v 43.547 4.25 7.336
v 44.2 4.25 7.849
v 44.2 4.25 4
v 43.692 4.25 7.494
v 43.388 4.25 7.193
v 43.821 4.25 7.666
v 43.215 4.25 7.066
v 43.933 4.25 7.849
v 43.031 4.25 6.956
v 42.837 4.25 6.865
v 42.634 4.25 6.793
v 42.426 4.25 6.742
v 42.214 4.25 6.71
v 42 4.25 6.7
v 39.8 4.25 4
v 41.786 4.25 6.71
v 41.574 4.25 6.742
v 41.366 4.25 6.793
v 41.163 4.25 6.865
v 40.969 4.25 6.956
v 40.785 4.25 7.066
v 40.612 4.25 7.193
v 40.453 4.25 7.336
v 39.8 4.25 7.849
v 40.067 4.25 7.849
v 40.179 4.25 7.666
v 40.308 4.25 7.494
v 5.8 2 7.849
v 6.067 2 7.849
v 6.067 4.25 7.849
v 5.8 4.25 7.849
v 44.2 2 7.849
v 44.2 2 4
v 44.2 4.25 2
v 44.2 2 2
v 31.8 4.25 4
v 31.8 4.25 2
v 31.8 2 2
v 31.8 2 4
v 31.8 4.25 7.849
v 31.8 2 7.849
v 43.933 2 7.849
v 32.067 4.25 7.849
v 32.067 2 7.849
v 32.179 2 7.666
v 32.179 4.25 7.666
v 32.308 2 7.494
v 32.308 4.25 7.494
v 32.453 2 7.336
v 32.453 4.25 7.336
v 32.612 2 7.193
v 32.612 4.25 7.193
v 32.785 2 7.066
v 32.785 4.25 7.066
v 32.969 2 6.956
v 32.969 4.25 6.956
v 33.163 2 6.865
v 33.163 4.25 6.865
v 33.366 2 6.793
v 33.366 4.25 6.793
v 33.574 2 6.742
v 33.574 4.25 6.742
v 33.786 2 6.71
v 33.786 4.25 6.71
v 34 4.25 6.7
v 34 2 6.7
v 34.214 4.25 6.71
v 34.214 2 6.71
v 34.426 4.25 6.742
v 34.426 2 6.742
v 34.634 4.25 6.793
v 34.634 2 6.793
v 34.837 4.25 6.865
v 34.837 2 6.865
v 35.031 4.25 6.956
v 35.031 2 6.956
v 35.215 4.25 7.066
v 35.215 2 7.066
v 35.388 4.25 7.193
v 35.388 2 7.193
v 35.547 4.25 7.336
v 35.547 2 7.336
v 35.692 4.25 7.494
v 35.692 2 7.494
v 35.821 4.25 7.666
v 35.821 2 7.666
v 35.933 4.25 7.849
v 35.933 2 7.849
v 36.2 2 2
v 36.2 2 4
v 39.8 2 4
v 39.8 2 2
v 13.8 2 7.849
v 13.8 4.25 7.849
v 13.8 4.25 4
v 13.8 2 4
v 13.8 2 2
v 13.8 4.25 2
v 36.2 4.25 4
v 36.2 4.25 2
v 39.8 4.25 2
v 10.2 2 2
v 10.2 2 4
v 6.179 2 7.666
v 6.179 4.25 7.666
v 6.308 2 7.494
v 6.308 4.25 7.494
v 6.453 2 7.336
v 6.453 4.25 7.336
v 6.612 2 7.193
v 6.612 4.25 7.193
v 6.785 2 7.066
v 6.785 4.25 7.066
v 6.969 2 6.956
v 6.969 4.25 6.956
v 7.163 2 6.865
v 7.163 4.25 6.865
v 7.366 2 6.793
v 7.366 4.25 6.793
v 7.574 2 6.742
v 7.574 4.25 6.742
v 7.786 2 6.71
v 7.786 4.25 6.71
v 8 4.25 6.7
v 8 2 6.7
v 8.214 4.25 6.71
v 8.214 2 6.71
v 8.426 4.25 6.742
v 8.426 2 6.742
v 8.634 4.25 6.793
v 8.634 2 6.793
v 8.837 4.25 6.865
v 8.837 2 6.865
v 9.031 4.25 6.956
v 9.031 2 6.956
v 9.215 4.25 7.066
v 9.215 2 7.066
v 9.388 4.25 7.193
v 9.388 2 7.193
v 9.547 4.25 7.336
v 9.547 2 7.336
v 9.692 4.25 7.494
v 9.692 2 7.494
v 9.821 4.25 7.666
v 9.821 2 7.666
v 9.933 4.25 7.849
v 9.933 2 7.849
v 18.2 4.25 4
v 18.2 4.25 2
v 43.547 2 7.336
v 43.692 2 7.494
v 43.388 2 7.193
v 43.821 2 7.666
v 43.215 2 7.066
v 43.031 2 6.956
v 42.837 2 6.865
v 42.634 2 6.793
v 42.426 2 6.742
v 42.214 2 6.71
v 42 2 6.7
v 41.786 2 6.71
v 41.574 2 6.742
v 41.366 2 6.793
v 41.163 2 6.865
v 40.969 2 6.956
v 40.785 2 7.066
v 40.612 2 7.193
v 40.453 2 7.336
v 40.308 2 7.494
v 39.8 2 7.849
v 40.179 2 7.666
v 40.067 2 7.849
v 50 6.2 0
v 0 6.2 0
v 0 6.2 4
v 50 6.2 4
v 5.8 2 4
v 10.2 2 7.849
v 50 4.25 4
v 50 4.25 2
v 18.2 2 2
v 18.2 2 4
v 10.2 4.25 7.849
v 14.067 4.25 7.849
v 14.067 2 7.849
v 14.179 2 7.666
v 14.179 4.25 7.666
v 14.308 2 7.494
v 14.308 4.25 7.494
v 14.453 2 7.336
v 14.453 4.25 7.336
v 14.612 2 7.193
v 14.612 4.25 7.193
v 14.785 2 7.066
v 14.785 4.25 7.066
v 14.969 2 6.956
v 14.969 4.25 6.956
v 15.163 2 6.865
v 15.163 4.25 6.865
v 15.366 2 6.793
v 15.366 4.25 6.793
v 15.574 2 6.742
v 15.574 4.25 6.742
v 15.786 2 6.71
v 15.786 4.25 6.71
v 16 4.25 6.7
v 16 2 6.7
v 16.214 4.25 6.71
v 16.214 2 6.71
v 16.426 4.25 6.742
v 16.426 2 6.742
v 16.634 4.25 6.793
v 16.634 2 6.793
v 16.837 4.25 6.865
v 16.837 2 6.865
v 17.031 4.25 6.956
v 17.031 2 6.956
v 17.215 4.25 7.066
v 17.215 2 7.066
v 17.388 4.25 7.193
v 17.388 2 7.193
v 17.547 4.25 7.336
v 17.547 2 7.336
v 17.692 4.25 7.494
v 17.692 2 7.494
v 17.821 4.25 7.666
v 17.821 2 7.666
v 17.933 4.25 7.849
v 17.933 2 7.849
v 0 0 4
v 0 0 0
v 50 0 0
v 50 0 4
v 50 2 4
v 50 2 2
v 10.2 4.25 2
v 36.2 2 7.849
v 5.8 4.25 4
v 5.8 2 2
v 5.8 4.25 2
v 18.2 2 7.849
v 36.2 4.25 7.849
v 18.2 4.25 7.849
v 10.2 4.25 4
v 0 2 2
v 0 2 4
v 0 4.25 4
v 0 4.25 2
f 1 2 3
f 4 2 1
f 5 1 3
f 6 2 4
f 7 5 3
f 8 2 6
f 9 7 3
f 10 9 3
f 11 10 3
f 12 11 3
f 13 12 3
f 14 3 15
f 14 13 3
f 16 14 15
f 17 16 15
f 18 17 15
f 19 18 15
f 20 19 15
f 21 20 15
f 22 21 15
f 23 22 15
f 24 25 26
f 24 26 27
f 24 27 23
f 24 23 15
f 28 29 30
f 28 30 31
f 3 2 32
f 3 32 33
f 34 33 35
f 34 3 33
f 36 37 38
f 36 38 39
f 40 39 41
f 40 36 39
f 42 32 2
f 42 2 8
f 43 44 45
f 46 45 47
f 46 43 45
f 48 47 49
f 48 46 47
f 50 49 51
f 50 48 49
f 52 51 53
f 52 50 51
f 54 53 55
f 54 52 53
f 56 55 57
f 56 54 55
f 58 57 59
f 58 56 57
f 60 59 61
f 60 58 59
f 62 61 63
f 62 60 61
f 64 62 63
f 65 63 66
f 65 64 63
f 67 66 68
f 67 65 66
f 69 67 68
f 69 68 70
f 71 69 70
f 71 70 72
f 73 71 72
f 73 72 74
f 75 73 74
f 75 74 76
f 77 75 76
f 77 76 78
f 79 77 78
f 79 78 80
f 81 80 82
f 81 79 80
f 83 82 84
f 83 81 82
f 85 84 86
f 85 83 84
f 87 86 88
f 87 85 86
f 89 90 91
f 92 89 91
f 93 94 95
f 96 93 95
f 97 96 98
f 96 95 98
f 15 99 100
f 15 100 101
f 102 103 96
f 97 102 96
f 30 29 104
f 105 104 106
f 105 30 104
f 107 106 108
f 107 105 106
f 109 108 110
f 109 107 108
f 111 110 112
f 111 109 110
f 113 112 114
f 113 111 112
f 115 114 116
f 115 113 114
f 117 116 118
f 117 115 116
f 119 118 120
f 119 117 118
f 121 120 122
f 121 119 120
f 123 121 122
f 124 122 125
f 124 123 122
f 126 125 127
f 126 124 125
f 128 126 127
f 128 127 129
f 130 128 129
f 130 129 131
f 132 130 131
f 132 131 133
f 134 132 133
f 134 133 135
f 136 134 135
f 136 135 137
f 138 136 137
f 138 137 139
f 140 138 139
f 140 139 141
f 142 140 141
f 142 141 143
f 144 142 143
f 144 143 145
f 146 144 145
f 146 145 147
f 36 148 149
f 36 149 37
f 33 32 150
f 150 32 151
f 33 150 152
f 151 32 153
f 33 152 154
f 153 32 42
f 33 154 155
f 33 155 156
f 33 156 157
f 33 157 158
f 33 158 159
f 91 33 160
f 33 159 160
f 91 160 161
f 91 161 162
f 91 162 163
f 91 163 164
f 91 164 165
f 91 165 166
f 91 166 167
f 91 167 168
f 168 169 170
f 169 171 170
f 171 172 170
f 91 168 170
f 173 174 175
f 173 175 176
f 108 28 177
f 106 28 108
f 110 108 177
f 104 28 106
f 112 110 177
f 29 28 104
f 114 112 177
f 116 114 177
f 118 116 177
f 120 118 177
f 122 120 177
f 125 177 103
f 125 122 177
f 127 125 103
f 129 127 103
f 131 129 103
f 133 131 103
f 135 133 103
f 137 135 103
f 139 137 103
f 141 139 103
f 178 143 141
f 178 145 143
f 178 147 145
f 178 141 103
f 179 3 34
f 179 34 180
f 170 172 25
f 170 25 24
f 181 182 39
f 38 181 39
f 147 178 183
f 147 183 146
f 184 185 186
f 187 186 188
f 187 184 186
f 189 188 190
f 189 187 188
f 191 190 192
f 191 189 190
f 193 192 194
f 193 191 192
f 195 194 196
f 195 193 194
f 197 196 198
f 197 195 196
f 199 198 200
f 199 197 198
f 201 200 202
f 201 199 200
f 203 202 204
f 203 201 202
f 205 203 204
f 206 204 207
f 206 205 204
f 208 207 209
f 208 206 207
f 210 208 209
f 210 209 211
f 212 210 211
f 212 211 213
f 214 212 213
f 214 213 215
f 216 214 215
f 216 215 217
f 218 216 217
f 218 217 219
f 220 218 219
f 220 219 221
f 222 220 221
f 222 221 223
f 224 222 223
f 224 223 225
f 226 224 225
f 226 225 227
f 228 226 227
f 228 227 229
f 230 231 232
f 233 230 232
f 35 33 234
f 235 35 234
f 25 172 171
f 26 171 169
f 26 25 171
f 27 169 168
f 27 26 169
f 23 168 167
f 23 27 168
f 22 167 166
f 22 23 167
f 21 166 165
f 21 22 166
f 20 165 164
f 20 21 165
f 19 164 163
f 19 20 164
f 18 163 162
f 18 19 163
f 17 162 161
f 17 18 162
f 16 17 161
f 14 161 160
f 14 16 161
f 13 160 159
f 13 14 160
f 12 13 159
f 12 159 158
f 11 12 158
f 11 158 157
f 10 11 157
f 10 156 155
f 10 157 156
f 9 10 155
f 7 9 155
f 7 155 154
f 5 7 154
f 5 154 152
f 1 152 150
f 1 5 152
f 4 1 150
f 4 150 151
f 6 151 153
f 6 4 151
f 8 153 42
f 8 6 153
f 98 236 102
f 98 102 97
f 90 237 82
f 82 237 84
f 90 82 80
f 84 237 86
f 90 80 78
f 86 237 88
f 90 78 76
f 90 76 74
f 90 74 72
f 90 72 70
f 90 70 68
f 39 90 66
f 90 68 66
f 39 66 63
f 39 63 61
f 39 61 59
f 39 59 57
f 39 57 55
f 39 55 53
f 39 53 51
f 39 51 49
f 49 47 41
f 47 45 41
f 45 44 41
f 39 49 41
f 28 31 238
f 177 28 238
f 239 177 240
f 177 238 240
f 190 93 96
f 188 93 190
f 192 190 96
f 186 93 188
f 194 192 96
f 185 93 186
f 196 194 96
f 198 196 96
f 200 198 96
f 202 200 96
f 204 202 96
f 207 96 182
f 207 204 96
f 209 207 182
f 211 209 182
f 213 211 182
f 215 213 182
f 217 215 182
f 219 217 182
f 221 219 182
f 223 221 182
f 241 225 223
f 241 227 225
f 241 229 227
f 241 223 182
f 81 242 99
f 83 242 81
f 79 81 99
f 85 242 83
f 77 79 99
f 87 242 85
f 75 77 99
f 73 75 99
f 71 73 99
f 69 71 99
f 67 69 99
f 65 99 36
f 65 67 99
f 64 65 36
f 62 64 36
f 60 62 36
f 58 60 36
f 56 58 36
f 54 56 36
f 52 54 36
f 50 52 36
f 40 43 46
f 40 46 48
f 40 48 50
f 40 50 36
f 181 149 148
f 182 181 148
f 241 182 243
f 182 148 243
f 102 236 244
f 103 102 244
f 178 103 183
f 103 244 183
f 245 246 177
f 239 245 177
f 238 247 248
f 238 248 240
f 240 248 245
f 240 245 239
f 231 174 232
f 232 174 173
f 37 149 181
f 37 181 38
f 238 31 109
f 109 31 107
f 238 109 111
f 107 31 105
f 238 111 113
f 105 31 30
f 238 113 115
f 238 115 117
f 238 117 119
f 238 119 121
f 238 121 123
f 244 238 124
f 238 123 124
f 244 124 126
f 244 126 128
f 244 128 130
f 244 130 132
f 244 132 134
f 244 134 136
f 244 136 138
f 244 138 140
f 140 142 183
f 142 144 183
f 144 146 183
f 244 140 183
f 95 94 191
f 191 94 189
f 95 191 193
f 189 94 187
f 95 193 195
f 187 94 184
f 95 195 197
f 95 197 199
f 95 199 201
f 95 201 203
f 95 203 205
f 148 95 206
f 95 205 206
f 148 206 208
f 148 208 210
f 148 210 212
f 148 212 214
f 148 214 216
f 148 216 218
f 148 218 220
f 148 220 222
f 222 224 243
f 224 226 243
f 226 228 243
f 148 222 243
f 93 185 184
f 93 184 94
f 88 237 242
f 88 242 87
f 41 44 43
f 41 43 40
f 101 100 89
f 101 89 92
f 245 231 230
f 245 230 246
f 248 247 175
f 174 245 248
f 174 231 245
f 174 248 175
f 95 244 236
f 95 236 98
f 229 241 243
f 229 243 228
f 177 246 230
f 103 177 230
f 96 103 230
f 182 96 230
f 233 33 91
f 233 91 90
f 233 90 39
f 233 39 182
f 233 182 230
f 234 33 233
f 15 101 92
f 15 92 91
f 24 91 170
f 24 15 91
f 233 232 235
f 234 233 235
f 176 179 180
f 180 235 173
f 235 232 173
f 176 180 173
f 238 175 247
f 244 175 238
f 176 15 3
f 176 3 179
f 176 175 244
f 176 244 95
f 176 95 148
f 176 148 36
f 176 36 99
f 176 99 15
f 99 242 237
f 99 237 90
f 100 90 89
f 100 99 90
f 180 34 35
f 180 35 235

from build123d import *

# Parameters (mm, degrees)
SKETCH_W             = 50
SKETCH_H             = 6.2
PAD_DEPTH            = 4
SKETCH001_W          = 50
SKETCH001_H          = 2.25
POCKET_DEPTH         = 2
PAD001_DEPTH         = 2.25
SKETCH003_W          = 58.610697
SKETCH003_H          = 2.473083
POCKET001_DEPTH      = 5
POCKET001_DEPTH_BACK = -5


with BuildPart() as part:
    # Sketch → Pad (new body)
    with BuildSketch(Plane.XY):
        with Locations((25, 3.1)):
            Rectangle(SKETCH_W, SKETCH_H)
    extrude(amount=PAD_DEPTH)

    # Sketch001 (on Face6 of Pad) → Pocket (cut)
    with BuildSketch(Plane.XY.offset(4)):
        with Locations((25, 3.125)):
            Rectangle(SKETCH001_W, SKETCH001_H)
    extrude(amount=-POCKET_DEPTH, mode=Mode.SUBTRACT)

    # Sketch002 (on Face8 of Pocket) → Pad001 (join)
    with BuildSketch(Plane.XZ.offset(-4.25)):
        with BuildLine():
            Line((5.8, 2), (10.2, 2))
            Line((10.2, 2), (10.2, 8.9))
            ThreePointArc((5.8, 8.9), (8, 6.7), (10.2, 8.9))
            Line((5.8, 8.9), (5.8, 2))
        make_face()
        with BuildLine():
            Line((13.8, 2), (18.2, 2))
            Line((18.2, 2), (18.2, 8.9))
            ThreePointArc((13.8, 8.9), (16, 6.7), (18.2, 8.9))
            Line((13.8, 8.9), (13.8, 2))
        make_face()
        with BuildLine():
            ThreePointArc((31.8, 8.9), (34, 6.7), (36.2, 8.9))
            Line((36.2, 8.9), (36.2, 2))
            Line((36.2, 2), (31.8, 2))
            Line((31.8, 2), (31.8, 8.9))
        make_face()
        with BuildLine():
            ThreePointArc((39.8, 8.9), (42, 6.7), (44.2, 8.9))
            Line((44.2, 8.9), (44.2, 2))
            Line((44.2, 2), (39.8, 2))
            Line((39.8, 2), (39.8, 8.9))
        make_face()
    extrude(amount=PAD001_DEPTH)

    # Sketch003 (on Face17 of Pad001) → Pocket001 (cut, two sides)
    with BuildSketch(Plane(origin=(0, 2, 0), x_dir=(-1, 0, 0), z_dir=(0, 1, 0))) as pocket001_sk:
        with Locations((-25.710698, 9.085399)):
            Rectangle(SKETCH003_W, SKETCH003_H)
    extrude(amount=-POCKET001_DEPTH, mode=Mode.SUBTRACT)
    extrude(pocket001_sk.sketch, amount=-POCKET001_DEPTH_BACK, mode=Mode.SUBTRACT)


solid = part.part
